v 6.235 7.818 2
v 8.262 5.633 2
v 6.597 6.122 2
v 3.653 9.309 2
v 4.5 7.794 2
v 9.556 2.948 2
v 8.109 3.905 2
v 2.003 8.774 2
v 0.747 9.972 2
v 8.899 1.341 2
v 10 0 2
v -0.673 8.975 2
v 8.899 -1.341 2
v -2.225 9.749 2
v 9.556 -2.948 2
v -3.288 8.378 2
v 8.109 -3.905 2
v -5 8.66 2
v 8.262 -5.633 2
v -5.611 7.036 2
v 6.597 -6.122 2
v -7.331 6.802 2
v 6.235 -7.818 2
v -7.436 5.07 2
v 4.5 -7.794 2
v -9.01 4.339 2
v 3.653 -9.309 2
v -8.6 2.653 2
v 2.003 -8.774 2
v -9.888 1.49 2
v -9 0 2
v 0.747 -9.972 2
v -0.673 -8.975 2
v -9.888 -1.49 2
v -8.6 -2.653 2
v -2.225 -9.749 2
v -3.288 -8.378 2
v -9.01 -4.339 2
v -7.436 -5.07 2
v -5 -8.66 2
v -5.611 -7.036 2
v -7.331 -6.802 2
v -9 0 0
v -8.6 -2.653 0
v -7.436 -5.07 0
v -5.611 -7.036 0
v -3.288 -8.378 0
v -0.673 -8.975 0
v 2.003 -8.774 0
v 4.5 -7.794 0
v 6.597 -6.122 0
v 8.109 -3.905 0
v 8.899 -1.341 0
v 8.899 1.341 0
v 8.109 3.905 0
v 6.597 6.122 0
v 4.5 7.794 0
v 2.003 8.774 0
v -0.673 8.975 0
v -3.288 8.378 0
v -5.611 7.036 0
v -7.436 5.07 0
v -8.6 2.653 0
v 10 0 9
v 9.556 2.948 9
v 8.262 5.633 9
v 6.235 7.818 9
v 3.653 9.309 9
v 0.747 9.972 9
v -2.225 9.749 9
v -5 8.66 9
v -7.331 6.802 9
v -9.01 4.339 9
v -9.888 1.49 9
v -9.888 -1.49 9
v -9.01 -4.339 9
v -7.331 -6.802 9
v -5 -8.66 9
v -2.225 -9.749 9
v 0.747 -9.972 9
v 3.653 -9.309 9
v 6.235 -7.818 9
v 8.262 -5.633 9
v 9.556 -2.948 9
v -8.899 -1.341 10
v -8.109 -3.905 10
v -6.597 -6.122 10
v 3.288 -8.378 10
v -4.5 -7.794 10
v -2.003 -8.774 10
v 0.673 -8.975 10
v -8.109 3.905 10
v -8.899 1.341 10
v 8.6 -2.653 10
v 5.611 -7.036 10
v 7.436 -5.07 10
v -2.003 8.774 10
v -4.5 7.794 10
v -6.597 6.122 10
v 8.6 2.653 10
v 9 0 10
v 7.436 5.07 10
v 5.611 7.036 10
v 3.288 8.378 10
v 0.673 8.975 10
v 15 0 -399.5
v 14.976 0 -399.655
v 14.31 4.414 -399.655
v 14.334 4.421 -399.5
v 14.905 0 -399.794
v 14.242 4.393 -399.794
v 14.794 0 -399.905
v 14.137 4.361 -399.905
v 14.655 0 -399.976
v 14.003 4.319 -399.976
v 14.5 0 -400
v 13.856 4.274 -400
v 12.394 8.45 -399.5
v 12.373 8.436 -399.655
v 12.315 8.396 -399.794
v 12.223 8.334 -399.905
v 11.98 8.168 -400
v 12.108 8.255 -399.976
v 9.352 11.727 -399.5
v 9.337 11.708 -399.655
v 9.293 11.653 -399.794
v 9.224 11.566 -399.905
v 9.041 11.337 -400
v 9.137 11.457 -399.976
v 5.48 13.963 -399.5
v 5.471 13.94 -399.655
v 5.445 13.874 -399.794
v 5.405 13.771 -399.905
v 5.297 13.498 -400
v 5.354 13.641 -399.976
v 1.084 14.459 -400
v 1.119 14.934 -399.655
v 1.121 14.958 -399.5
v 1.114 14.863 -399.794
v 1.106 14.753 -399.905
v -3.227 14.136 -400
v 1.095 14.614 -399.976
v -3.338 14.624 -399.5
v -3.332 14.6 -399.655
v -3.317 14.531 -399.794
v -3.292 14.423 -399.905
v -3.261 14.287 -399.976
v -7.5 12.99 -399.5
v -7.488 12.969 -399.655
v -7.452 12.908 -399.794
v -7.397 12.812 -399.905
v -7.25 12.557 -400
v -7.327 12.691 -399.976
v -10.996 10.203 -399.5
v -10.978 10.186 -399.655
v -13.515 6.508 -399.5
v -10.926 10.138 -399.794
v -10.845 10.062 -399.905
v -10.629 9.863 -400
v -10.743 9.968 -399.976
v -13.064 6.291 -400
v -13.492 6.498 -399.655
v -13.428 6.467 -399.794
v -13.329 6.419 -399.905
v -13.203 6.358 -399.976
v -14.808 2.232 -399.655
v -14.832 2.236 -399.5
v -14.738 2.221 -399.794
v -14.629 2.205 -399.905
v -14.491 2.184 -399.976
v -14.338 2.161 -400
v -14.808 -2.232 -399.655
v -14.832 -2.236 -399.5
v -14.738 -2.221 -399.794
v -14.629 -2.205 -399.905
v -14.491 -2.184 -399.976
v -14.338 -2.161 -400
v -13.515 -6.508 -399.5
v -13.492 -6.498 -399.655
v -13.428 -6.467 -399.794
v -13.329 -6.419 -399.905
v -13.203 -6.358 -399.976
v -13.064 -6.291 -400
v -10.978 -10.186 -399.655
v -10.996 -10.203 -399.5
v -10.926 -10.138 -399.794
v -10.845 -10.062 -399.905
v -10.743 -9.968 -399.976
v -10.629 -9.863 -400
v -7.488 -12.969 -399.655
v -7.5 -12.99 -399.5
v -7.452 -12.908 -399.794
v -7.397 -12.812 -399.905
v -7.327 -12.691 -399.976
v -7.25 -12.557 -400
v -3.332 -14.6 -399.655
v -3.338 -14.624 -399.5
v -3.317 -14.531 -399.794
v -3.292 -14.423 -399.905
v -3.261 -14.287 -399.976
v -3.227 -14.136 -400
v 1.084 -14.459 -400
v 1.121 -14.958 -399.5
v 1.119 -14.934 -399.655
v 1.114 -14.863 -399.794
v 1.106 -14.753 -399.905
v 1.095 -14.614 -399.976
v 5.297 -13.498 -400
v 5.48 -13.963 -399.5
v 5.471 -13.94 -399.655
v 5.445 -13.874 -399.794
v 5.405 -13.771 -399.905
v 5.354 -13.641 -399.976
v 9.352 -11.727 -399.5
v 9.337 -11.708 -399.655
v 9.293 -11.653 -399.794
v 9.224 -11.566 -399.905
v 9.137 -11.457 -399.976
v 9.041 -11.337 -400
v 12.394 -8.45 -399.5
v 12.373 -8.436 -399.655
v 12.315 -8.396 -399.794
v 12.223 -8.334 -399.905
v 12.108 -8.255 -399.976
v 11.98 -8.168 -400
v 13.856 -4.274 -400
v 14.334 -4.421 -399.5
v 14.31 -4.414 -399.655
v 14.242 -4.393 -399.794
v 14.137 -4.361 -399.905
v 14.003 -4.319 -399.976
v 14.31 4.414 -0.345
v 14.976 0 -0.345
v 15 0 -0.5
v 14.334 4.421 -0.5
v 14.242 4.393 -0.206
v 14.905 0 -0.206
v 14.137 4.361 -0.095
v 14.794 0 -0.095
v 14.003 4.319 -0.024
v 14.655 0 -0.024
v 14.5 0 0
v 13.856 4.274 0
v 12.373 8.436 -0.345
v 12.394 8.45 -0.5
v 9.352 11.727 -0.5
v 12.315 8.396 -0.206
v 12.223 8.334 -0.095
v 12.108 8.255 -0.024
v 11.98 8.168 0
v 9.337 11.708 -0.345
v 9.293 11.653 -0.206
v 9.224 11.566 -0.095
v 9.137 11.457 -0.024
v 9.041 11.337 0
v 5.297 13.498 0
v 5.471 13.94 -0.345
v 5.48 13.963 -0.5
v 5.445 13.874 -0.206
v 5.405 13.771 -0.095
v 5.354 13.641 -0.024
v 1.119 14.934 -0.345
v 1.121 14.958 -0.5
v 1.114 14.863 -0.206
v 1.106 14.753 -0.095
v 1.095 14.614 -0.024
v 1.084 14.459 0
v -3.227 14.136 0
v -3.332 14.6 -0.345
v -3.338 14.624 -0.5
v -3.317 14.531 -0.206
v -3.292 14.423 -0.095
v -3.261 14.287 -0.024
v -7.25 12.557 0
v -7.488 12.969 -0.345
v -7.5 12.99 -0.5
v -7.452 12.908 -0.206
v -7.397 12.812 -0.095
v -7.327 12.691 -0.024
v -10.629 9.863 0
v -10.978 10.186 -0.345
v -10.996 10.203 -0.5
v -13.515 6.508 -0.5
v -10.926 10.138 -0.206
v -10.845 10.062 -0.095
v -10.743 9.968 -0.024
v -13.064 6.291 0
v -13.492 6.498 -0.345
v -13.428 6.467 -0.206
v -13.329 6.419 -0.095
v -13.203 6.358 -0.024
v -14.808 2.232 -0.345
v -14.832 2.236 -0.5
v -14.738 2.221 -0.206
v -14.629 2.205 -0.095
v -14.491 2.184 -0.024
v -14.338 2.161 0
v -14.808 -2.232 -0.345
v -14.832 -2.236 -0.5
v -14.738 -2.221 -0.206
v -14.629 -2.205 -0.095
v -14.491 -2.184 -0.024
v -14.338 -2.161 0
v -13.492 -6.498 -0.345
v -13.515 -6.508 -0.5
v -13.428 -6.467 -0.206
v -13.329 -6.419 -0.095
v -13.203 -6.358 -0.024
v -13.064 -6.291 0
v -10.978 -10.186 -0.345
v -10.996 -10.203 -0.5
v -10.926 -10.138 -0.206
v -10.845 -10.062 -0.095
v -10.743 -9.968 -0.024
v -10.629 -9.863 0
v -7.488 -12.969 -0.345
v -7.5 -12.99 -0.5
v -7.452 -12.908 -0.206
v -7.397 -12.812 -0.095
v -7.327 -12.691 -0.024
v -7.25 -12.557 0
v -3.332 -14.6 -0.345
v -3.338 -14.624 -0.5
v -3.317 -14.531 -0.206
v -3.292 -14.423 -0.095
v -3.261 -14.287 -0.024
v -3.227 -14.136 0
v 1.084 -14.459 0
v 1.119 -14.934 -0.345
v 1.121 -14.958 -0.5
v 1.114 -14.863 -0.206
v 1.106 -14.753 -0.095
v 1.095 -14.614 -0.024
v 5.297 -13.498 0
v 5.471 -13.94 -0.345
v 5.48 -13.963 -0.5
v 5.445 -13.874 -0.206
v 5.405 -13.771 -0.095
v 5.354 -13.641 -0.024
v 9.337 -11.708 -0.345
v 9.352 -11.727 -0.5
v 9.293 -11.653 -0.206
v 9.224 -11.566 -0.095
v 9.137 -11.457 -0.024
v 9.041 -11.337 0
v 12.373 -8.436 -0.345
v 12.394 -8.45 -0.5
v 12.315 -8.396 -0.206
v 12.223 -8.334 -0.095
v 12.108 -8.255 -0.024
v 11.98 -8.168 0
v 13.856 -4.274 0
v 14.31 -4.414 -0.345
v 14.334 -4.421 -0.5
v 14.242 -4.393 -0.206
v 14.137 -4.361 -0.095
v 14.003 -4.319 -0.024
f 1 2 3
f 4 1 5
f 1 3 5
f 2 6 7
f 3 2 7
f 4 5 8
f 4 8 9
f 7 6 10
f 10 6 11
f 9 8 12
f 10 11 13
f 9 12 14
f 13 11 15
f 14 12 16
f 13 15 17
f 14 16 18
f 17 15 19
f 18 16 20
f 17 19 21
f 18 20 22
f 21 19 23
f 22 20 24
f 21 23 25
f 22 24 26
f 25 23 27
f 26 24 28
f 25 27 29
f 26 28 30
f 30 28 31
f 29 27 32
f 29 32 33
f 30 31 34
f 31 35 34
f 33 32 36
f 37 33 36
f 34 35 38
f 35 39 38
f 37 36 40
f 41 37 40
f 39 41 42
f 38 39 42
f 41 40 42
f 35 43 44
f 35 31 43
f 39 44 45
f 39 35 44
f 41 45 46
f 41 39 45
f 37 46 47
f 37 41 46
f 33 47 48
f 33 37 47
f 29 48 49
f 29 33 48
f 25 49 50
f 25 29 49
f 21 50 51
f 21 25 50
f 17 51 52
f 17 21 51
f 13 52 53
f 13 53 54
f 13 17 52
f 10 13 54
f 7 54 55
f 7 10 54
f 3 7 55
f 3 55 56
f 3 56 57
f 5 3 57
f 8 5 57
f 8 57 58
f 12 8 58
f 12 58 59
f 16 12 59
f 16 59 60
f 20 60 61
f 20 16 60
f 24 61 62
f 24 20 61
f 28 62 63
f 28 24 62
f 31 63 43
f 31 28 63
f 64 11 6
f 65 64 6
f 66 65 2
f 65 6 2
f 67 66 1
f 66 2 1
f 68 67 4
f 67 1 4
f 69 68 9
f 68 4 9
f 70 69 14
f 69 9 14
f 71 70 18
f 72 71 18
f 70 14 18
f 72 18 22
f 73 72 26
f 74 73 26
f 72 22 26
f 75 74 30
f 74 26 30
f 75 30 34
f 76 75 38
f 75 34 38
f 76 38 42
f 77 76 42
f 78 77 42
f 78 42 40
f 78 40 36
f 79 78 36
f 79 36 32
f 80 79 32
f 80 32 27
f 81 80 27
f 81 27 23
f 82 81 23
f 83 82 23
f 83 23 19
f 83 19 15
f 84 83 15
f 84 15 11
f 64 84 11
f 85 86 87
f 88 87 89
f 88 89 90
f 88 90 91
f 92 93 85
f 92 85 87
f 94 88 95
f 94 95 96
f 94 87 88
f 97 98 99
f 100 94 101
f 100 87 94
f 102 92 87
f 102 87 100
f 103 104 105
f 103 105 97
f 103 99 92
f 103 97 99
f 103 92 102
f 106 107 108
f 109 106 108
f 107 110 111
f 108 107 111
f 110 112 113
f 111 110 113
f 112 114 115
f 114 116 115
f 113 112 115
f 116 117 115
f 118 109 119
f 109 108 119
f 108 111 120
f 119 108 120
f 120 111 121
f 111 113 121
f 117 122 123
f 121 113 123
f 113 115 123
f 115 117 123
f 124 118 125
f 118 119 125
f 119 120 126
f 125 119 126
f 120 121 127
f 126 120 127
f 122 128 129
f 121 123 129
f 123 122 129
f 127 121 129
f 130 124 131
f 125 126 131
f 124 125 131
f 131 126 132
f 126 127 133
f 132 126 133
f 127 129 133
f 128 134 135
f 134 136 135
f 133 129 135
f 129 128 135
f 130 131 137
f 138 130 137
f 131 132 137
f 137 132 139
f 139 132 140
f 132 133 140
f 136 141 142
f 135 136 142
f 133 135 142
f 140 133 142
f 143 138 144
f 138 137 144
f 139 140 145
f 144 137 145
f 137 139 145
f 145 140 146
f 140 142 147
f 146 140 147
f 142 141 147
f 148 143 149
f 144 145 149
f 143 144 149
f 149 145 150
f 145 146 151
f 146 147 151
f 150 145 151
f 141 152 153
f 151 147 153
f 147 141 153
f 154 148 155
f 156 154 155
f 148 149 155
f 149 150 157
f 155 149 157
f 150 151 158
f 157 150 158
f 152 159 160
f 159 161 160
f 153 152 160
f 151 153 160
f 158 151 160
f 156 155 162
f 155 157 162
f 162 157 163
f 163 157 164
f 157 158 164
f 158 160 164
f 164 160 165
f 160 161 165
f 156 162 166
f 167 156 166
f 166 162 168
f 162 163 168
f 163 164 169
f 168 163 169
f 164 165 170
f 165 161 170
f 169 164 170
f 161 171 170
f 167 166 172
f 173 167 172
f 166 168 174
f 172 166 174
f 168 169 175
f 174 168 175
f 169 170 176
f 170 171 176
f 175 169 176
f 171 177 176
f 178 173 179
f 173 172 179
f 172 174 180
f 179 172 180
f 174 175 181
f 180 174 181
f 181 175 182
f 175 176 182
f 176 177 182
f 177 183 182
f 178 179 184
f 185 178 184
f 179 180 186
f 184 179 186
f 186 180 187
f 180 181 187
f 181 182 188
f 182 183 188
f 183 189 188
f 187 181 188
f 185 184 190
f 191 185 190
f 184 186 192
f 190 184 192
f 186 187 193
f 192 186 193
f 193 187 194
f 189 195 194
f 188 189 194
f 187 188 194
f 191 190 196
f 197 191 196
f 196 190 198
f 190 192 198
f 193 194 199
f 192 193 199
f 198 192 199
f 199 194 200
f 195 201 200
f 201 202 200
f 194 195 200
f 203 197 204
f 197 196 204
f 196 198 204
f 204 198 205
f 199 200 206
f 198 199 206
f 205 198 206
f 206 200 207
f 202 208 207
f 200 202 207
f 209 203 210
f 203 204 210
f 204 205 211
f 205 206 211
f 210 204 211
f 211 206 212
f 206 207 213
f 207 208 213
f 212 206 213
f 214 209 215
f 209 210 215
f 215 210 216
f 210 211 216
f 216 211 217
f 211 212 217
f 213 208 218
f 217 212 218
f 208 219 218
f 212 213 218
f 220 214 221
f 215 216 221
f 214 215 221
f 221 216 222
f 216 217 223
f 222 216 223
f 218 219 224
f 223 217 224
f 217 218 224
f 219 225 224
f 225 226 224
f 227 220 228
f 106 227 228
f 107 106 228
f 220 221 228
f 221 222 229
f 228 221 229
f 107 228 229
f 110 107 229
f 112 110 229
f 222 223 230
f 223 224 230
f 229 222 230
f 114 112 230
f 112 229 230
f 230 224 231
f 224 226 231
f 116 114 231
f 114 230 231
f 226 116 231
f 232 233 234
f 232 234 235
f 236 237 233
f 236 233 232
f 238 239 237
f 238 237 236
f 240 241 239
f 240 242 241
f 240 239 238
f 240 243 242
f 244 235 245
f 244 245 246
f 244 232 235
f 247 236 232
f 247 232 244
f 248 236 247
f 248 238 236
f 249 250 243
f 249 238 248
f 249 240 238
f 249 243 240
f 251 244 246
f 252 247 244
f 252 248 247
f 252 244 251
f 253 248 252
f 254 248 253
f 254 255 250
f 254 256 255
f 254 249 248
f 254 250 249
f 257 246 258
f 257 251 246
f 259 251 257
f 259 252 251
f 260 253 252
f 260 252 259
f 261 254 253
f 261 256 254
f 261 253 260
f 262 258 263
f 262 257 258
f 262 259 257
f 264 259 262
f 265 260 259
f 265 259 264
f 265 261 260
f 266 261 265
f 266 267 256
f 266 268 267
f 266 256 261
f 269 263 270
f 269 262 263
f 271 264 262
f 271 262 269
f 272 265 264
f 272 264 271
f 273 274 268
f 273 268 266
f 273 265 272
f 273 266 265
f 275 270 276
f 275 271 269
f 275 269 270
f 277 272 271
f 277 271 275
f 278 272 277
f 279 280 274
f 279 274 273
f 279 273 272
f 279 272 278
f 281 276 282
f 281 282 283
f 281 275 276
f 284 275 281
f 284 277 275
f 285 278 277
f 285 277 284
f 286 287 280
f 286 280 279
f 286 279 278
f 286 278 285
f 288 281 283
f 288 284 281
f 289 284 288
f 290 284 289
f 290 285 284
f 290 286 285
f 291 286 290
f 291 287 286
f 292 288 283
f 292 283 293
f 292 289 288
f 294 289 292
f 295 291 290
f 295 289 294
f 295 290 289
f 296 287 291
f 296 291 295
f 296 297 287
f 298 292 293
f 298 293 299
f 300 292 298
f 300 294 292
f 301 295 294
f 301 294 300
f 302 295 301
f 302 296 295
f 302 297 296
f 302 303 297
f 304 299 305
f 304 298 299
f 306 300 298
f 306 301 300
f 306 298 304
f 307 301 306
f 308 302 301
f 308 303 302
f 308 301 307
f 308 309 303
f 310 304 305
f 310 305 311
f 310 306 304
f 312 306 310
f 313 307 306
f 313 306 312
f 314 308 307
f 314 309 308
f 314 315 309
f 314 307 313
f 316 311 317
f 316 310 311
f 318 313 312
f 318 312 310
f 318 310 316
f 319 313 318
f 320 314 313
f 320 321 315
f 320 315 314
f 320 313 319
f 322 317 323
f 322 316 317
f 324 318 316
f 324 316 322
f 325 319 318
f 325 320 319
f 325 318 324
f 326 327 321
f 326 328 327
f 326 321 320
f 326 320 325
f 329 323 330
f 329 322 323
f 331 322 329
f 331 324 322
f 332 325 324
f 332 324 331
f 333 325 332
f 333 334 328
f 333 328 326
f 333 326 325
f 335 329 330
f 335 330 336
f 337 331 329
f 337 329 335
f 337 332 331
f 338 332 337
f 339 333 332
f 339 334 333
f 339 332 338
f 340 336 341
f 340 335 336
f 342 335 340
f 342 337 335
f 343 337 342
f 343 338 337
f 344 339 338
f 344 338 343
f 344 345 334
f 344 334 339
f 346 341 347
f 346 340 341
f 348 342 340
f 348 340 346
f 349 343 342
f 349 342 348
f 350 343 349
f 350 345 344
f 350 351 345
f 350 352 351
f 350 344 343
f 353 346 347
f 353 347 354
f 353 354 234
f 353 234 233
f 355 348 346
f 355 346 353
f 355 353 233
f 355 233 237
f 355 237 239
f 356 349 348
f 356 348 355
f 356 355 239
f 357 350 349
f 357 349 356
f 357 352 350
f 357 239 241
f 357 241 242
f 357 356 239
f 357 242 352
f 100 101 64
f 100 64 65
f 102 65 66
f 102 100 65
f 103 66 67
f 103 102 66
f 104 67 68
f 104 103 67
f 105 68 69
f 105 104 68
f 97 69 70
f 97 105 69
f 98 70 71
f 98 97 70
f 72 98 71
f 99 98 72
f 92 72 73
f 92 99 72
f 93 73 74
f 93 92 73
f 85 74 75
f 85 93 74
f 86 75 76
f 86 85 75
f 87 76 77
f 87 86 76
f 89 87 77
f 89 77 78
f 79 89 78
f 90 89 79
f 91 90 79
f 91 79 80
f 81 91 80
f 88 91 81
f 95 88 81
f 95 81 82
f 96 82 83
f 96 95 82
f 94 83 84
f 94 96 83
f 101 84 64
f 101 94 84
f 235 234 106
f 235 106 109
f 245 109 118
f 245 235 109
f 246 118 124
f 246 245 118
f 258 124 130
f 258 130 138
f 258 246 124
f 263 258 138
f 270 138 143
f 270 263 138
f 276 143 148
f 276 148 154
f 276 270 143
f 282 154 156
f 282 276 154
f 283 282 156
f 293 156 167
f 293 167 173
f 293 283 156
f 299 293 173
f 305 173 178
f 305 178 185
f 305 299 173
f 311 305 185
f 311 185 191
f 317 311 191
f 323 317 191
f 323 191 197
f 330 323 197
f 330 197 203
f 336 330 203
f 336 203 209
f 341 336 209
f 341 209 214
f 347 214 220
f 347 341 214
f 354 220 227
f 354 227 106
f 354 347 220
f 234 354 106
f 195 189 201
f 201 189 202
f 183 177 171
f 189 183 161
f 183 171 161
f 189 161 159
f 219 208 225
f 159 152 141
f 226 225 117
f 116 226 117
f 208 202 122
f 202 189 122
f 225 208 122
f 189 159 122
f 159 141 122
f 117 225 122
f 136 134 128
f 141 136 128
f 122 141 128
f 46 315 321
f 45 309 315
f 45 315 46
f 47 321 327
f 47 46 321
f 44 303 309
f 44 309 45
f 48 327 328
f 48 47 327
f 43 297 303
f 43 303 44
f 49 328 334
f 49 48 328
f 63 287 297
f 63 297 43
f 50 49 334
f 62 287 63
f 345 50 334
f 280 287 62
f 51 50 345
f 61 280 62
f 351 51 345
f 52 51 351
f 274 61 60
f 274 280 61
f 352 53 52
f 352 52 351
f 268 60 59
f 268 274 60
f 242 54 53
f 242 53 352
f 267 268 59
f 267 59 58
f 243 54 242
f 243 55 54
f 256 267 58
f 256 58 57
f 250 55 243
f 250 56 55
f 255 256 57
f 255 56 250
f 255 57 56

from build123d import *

# Parameters (mm, degrees)
F0_R     = 15
F1_DEPTH = 400
F2_R     = 10
F3_DEPTH = 10
F4_R     = 0.5
F5_SIZE  = 1
F6_W     = 1
F6_H     = 2


with BuildPart() as f1:
    # F0 (on Top) → F1 (new body)
    with BuildSketch(Plane.XY):
        Circle(F0_R)
    extrude(amount=-F1_DEPTH)

    # F2 (on face) → F3 (join)
    with BuildSketch(Plane.XY):
        Circle(F2_R)
    extrude(amount=F3_DEPTH)

    # F4
    f4_edges = [f1.edges().sort_by_distance(p)[0] for p in [
        (-15, 0, -400),
        (-15, 0, 0),
    ]]
    fillet(f4_edges, radius=F4_R)

    # F5
    f5_edges = [f1.edges().sort_by_distance(p)[0] for p in [
        (-10, 0, 10),
    ]]
    chamfer(f5_edges, length=F5_SIZE)

    # F6 (on Front) → F7 (revolve, cut)
    with BuildSketch(Plane.XZ):
        with Locations((-9.5, 1)):
            Rectangle(F6_W, F6_H)
    revolve(axis=Axis((0, 0, 12.057068), (0, 0, 1)), mode=Mode.SUBTRACT)


solid = f1.part
